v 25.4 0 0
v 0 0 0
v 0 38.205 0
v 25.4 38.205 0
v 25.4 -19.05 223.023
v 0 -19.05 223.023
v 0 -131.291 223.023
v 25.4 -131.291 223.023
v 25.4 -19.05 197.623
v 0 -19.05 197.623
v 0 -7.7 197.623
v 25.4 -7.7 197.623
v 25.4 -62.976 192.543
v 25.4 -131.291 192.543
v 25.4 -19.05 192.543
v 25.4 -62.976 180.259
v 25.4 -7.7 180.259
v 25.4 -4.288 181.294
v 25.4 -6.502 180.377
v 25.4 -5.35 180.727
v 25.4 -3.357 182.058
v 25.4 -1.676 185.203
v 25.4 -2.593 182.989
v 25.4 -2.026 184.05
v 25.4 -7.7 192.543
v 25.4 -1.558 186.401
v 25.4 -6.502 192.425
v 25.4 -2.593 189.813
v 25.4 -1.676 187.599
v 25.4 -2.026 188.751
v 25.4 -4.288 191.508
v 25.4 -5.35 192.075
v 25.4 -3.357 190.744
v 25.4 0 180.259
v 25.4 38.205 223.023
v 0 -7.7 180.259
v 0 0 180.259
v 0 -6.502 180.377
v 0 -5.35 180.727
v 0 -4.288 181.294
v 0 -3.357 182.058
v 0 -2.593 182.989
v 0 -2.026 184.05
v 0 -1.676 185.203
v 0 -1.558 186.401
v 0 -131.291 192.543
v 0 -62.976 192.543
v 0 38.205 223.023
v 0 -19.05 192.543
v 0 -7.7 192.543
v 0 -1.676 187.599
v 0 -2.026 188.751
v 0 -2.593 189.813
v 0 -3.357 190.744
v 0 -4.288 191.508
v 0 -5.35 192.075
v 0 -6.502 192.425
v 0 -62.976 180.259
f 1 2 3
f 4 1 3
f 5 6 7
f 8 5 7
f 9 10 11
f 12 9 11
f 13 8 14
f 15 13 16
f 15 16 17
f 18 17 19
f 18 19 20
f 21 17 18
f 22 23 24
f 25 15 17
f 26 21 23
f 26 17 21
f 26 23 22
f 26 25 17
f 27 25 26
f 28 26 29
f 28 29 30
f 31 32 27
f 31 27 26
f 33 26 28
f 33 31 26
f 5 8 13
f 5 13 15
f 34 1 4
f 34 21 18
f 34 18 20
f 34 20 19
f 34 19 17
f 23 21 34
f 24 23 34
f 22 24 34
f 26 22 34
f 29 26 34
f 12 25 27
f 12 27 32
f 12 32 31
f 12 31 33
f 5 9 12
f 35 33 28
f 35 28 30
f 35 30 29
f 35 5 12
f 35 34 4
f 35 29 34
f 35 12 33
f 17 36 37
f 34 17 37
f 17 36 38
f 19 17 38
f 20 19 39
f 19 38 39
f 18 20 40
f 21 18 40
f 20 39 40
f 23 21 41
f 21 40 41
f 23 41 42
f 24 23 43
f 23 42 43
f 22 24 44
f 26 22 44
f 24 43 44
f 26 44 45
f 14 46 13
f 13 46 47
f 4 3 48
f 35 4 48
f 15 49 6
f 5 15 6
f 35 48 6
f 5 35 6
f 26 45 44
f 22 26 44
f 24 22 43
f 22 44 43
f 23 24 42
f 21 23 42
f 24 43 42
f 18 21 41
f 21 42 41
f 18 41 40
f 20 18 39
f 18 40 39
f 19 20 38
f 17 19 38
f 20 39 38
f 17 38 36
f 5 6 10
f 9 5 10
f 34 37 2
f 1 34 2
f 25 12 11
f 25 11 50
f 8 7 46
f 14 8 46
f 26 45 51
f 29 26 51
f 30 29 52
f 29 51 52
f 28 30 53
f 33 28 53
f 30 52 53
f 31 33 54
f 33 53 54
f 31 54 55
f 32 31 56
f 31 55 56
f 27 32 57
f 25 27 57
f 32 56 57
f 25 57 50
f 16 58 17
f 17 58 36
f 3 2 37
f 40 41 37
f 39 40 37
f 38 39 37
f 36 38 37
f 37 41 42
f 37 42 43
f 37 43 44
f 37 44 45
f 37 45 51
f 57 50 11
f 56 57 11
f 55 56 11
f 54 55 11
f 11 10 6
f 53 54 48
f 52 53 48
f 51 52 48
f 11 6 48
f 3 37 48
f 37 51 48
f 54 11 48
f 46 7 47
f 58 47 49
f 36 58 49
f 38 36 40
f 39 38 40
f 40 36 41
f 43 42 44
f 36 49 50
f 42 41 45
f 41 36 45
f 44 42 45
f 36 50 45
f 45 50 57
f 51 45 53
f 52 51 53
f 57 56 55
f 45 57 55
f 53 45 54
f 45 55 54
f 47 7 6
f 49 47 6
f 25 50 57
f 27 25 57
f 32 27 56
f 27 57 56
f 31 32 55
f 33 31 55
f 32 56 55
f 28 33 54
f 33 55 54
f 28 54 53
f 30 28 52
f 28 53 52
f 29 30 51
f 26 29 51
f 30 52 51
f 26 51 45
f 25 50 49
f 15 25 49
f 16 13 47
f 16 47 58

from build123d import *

# Parameters (mm, degrees)
F1_DEPTH = 25.4
F2_DEPTH = 25.4


with BuildPart() as f1:
    # F0 (on Right) → F1 (new body)
    with BuildSketch(Plane.YZ):
        Polygon((0, 180.259005), (0, 0), (38.204829, 0), (38.204829, 223.022597), (-19.05, 223.022597), (-19.05, 197.622597), (-7.7, 197.622597), (0, 197.622597), align=None)
        with BuildLine():
            Line((-7.7, 180.259005), (0, 180.259005))
            Line((0, 180.259005), (0, 197.622597))
            Line((0, 197.622597), (-7.7, 197.622597))
            Line((-7.7, 197.622597), (-7.7, 192.542597))
            ThreePointArc((-7.7, 192.542597), (-3.357094, 190.743707), (-1.558204, 186.400801))
            ThreePointArc((-1.558204, 186.400801), (-3.357094, 182.057895), (-7.7, 180.259005))
        make_face()
    extrude(amount=F1_DEPTH)


with BuildPart() as f2:
    # F0 (on Right) → F2 (new body)
    with BuildSketch(Plane.YZ):
        Polygon((-19.05, 197.622597), (-19.05, 223.022597), (-131.290744, 223.022597), (-131.290744, 192.542597), (-62.97622, 192.542597), (-19.05, 192.542597), align=None)
        with BuildLine():
            Line((-62.97622, 180.259005), (-7.7, 180.259005))
            ThreePointArc((-7.7, 180.259005), (-13.841796, 186.400801), (-7.7, 192.542597))
            Line((-7.7, 192.542597), (-19.05, 192.542597))
            Line((-19.05, 192.542597), (-62.97622, 192.542597))
            Line((-62.97622, 192.542597), (-62.97622, 180.259005))
        make_face()
        with BuildLine():
            Line((-7.7, 192.542597), (-7.7, 180.259005))
            ThreePointArc((-7.7, 180.259005), (-3.357094, 182.057895), (-1.558204, 186.400801))
            ThreePointArc((-1.558204, 186.400801), (-3.357094, 190.743707), (-7.7, 192.542597))
        make_face()
        with BuildLine():
            ThreePointArc((-7.7, 192.542597), (-13.841796, 186.400801), (-7.7, 180.259005))
            Line((-7.7, 180.259005), (-7.7, 192.542597))
        make_face()
    extrude(amount=F2_DEPTH)


solid = Compound([f1.part, f2.part])
